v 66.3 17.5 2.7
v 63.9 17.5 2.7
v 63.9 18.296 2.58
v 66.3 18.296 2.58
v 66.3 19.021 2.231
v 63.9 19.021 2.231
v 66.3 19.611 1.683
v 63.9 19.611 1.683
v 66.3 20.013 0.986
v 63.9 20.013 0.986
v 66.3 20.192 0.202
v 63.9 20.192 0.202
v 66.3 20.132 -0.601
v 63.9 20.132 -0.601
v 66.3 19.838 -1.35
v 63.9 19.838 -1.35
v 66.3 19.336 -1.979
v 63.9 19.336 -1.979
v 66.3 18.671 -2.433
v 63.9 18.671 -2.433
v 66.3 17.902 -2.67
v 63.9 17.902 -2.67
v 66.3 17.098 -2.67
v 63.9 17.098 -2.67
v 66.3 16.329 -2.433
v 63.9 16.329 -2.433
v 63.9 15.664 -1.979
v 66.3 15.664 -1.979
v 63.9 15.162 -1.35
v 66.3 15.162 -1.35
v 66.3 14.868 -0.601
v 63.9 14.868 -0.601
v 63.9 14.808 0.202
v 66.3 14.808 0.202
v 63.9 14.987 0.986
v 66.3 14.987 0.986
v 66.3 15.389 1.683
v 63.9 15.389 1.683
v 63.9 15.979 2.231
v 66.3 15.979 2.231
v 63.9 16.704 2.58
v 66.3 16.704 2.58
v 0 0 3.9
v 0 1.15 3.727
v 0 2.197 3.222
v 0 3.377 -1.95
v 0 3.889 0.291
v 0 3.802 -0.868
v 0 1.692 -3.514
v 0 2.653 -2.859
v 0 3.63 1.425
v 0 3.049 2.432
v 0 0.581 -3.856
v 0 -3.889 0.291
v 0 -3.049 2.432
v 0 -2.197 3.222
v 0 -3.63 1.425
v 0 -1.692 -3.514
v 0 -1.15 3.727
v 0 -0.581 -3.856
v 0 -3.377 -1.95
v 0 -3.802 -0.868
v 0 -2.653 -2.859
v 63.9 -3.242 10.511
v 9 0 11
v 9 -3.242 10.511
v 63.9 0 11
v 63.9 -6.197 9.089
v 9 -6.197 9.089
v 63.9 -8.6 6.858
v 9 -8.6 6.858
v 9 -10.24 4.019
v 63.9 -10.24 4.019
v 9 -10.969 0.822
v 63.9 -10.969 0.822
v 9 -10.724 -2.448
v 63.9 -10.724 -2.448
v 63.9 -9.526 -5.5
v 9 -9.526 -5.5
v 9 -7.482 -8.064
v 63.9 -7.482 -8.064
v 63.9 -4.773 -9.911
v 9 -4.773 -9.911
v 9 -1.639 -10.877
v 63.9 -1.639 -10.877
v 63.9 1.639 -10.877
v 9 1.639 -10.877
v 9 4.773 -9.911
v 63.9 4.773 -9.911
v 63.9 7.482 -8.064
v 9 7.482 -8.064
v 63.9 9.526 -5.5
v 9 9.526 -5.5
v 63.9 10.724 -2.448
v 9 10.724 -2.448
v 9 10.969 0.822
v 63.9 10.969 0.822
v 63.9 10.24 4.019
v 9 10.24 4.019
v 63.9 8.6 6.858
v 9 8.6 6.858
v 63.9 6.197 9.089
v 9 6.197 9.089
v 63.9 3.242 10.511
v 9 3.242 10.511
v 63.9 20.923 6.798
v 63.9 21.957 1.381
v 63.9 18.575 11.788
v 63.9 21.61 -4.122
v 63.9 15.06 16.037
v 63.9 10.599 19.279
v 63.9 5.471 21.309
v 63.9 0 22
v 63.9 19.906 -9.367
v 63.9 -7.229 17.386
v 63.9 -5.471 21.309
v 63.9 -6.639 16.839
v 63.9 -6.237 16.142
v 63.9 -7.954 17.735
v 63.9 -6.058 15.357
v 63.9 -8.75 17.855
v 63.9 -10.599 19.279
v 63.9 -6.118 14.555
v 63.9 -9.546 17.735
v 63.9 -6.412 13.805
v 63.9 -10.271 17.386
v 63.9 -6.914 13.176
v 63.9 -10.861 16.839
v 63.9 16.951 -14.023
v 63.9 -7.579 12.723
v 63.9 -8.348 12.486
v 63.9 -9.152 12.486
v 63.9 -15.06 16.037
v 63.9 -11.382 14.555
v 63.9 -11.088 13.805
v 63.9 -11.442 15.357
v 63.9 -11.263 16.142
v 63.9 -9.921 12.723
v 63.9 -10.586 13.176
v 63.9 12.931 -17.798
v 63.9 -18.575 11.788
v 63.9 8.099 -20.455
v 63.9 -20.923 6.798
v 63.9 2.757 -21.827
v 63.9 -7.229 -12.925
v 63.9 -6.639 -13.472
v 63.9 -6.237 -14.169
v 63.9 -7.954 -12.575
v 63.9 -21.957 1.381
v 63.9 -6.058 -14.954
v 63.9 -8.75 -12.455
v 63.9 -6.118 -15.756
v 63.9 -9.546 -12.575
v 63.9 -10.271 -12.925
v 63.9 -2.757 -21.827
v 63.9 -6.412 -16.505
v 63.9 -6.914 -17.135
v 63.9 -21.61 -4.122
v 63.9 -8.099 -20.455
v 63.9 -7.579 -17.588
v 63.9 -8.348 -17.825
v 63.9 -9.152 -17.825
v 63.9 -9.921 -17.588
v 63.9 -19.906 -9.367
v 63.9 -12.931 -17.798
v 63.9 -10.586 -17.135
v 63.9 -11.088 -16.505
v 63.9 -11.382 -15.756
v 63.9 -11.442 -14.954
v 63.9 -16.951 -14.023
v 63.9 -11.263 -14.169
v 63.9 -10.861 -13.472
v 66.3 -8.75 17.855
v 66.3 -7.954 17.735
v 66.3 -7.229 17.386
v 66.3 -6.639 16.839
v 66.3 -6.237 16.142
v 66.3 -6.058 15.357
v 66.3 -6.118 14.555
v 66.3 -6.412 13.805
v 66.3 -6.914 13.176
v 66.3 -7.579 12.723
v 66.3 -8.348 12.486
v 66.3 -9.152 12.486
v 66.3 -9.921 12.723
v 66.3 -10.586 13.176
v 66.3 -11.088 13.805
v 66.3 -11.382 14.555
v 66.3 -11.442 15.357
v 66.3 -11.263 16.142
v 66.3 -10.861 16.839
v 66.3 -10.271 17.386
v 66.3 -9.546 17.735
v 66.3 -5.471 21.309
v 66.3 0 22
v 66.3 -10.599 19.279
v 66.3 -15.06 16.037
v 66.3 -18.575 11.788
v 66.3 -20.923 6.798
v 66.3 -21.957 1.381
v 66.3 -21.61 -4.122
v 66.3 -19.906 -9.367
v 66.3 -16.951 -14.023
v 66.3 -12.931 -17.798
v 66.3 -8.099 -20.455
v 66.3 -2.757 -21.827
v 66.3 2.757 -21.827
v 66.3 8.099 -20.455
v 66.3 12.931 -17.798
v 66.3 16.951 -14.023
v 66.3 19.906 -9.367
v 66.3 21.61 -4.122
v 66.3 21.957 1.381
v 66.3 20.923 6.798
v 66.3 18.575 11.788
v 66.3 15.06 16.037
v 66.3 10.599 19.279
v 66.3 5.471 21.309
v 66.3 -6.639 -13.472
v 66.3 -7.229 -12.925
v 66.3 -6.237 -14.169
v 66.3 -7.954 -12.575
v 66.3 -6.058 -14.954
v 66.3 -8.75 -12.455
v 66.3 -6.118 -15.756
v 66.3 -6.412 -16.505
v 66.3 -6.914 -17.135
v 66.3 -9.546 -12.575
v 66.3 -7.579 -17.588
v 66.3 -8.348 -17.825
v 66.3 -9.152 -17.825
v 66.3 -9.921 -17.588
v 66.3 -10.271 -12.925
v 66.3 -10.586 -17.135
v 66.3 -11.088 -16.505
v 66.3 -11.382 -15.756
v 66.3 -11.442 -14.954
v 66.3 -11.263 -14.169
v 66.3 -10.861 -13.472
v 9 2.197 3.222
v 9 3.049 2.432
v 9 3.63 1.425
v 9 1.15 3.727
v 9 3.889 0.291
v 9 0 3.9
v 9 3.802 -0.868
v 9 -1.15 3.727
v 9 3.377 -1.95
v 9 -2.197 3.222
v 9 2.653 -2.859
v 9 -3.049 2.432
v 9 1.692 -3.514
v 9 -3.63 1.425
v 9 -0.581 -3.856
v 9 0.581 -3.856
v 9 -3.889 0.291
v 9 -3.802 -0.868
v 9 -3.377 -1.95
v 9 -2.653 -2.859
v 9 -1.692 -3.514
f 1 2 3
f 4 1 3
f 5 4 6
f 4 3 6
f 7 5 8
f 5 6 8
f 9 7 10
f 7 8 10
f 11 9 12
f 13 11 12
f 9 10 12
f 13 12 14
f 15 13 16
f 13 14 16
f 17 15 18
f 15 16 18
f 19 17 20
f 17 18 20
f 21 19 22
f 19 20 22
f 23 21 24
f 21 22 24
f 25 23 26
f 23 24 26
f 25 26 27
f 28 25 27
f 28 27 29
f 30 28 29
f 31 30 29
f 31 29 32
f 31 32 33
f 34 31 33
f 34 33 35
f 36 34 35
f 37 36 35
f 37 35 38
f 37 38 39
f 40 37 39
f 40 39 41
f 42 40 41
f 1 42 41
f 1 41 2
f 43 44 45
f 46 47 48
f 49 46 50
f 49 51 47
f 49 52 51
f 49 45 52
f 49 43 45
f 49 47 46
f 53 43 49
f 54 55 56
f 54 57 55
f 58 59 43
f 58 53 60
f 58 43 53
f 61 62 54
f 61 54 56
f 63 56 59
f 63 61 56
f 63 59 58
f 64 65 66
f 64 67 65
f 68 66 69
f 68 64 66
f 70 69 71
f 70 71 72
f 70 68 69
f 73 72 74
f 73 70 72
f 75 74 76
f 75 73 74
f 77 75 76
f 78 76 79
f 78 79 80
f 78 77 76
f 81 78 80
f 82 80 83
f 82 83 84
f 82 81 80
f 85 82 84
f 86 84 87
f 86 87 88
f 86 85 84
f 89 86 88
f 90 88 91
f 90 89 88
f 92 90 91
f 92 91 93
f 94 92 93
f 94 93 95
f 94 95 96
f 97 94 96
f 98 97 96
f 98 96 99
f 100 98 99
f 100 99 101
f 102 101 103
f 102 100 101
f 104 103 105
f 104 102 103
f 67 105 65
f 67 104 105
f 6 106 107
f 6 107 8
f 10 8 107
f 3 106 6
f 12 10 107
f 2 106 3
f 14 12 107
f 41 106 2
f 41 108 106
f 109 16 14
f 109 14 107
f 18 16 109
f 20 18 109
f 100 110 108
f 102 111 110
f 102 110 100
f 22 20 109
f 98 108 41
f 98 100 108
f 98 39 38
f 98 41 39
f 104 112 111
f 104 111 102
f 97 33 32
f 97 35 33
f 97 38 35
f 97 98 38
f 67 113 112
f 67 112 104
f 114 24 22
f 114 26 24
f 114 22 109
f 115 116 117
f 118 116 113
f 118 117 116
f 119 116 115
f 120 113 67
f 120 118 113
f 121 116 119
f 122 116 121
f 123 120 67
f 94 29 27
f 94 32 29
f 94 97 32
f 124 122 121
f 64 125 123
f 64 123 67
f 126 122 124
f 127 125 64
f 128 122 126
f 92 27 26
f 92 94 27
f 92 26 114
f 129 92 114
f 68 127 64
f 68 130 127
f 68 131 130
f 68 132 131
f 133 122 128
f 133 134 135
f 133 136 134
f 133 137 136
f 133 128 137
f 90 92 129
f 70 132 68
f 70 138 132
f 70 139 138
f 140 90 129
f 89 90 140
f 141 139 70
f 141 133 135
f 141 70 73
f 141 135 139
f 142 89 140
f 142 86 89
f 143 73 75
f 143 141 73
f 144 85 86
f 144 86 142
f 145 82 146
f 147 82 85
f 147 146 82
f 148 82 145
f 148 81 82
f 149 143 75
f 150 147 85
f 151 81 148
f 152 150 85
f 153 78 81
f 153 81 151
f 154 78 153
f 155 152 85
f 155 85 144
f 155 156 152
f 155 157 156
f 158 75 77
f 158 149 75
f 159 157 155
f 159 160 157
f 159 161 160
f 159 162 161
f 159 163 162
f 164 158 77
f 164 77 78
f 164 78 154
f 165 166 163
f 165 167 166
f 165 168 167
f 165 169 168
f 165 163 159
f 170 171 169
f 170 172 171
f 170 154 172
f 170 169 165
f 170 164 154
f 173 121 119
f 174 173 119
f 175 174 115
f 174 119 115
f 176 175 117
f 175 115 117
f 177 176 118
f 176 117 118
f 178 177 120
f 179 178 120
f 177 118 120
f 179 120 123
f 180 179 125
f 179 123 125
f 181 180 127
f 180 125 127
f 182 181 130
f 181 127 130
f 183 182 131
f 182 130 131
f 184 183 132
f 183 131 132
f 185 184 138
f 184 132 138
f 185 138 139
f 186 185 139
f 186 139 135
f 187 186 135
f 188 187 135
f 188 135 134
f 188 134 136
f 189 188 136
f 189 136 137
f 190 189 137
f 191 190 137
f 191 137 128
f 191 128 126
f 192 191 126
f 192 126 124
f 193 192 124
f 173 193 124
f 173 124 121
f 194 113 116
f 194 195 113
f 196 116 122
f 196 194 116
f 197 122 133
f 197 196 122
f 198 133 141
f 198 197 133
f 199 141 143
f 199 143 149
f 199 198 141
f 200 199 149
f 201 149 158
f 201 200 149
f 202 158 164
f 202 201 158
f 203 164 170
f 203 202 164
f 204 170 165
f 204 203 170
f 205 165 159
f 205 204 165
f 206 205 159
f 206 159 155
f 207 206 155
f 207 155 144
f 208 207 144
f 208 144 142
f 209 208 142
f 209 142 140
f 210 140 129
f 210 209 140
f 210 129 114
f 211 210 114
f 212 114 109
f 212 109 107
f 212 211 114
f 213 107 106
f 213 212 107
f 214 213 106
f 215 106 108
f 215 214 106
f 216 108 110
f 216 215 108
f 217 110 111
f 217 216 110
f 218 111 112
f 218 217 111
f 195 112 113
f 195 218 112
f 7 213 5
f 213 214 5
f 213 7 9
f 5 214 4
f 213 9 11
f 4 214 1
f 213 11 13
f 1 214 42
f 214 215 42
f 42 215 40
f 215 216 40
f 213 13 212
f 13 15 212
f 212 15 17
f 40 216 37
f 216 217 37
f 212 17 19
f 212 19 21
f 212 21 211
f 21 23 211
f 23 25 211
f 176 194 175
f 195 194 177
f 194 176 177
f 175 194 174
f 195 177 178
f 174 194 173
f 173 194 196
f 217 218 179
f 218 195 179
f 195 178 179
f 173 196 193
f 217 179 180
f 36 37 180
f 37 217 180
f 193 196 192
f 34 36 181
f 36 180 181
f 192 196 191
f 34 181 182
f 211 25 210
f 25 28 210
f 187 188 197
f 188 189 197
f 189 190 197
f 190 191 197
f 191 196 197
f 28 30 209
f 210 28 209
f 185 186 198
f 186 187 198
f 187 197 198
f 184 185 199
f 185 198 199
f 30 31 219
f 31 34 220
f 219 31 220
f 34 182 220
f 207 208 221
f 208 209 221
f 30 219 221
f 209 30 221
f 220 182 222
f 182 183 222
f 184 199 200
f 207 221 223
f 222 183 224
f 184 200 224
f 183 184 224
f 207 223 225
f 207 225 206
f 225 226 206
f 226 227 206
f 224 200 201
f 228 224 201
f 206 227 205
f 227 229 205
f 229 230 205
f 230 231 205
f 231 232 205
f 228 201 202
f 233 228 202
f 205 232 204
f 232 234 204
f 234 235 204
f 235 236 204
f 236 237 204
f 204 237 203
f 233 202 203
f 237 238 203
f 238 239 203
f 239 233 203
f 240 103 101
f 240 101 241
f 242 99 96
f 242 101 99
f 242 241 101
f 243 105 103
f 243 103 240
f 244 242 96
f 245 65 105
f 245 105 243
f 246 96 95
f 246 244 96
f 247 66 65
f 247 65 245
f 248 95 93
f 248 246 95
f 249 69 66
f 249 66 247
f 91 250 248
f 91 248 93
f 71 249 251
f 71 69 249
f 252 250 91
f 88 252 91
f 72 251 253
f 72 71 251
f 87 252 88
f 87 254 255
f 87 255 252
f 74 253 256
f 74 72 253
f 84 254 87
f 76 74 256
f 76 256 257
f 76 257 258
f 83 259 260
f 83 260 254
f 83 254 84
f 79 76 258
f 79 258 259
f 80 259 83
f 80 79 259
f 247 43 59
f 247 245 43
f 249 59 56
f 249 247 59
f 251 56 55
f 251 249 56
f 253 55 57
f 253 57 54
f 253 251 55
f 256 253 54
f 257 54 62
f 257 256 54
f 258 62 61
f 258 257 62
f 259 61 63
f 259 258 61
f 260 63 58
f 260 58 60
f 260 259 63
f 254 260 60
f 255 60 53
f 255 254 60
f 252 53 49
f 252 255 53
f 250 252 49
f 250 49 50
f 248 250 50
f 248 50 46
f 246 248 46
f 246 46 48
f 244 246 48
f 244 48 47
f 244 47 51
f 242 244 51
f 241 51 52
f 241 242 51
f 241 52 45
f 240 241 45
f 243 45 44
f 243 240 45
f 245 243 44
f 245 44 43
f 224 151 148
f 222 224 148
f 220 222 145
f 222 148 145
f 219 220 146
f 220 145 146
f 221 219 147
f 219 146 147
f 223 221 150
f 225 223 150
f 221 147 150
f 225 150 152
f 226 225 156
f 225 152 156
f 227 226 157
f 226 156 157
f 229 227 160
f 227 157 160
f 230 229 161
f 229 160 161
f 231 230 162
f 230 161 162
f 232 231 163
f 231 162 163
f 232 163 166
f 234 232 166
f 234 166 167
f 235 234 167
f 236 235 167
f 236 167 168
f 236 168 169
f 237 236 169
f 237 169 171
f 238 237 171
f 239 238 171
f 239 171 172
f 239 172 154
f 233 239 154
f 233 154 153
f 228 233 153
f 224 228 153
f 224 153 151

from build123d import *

# Parameters (mm, degrees)
SKETCH_2_R          = 2.7
CUT_EXTRUDE_1_DEPTH = 10


with BuildPart() as part:
    # 草图1 → 旋转1 (revolve)
    with BuildSketch(Plane.XY, mode=Mode.PRIVATE) as revolve_1_sk:
        Polygon((0, 0), (0, 3.9), (9, 3.9), (9, 11), (63.9, 11), (63.9, 22), (66.3, 22), (66.3, 11), (66.3, 0), align=None)
    revolve(revolve_1_sk.sketch.rotate(Axis((0, 0, 0), (1, 0, 0)), 90), axis=Axis((0, 0, 0), (1, 0, 0)))

    # 草图2 → 切除-拉伸1 (cut)
    with BuildSketch(Plane.ZY.offset(-63.9)):
        with Locations((0, 17.5)):
            Circle(SKETCH_2_R)
        with Locations((15.155444566, -8.75)):
            Circle(SKETCH_2_R)
        with Locations((-15.155444566, -8.75)):
            Circle(SKETCH_2_R)
    extrude(amount=-CUT_EXTRUDE_1_DEPTH, mode=Mode.SUBTRACT)


solid = part.part
